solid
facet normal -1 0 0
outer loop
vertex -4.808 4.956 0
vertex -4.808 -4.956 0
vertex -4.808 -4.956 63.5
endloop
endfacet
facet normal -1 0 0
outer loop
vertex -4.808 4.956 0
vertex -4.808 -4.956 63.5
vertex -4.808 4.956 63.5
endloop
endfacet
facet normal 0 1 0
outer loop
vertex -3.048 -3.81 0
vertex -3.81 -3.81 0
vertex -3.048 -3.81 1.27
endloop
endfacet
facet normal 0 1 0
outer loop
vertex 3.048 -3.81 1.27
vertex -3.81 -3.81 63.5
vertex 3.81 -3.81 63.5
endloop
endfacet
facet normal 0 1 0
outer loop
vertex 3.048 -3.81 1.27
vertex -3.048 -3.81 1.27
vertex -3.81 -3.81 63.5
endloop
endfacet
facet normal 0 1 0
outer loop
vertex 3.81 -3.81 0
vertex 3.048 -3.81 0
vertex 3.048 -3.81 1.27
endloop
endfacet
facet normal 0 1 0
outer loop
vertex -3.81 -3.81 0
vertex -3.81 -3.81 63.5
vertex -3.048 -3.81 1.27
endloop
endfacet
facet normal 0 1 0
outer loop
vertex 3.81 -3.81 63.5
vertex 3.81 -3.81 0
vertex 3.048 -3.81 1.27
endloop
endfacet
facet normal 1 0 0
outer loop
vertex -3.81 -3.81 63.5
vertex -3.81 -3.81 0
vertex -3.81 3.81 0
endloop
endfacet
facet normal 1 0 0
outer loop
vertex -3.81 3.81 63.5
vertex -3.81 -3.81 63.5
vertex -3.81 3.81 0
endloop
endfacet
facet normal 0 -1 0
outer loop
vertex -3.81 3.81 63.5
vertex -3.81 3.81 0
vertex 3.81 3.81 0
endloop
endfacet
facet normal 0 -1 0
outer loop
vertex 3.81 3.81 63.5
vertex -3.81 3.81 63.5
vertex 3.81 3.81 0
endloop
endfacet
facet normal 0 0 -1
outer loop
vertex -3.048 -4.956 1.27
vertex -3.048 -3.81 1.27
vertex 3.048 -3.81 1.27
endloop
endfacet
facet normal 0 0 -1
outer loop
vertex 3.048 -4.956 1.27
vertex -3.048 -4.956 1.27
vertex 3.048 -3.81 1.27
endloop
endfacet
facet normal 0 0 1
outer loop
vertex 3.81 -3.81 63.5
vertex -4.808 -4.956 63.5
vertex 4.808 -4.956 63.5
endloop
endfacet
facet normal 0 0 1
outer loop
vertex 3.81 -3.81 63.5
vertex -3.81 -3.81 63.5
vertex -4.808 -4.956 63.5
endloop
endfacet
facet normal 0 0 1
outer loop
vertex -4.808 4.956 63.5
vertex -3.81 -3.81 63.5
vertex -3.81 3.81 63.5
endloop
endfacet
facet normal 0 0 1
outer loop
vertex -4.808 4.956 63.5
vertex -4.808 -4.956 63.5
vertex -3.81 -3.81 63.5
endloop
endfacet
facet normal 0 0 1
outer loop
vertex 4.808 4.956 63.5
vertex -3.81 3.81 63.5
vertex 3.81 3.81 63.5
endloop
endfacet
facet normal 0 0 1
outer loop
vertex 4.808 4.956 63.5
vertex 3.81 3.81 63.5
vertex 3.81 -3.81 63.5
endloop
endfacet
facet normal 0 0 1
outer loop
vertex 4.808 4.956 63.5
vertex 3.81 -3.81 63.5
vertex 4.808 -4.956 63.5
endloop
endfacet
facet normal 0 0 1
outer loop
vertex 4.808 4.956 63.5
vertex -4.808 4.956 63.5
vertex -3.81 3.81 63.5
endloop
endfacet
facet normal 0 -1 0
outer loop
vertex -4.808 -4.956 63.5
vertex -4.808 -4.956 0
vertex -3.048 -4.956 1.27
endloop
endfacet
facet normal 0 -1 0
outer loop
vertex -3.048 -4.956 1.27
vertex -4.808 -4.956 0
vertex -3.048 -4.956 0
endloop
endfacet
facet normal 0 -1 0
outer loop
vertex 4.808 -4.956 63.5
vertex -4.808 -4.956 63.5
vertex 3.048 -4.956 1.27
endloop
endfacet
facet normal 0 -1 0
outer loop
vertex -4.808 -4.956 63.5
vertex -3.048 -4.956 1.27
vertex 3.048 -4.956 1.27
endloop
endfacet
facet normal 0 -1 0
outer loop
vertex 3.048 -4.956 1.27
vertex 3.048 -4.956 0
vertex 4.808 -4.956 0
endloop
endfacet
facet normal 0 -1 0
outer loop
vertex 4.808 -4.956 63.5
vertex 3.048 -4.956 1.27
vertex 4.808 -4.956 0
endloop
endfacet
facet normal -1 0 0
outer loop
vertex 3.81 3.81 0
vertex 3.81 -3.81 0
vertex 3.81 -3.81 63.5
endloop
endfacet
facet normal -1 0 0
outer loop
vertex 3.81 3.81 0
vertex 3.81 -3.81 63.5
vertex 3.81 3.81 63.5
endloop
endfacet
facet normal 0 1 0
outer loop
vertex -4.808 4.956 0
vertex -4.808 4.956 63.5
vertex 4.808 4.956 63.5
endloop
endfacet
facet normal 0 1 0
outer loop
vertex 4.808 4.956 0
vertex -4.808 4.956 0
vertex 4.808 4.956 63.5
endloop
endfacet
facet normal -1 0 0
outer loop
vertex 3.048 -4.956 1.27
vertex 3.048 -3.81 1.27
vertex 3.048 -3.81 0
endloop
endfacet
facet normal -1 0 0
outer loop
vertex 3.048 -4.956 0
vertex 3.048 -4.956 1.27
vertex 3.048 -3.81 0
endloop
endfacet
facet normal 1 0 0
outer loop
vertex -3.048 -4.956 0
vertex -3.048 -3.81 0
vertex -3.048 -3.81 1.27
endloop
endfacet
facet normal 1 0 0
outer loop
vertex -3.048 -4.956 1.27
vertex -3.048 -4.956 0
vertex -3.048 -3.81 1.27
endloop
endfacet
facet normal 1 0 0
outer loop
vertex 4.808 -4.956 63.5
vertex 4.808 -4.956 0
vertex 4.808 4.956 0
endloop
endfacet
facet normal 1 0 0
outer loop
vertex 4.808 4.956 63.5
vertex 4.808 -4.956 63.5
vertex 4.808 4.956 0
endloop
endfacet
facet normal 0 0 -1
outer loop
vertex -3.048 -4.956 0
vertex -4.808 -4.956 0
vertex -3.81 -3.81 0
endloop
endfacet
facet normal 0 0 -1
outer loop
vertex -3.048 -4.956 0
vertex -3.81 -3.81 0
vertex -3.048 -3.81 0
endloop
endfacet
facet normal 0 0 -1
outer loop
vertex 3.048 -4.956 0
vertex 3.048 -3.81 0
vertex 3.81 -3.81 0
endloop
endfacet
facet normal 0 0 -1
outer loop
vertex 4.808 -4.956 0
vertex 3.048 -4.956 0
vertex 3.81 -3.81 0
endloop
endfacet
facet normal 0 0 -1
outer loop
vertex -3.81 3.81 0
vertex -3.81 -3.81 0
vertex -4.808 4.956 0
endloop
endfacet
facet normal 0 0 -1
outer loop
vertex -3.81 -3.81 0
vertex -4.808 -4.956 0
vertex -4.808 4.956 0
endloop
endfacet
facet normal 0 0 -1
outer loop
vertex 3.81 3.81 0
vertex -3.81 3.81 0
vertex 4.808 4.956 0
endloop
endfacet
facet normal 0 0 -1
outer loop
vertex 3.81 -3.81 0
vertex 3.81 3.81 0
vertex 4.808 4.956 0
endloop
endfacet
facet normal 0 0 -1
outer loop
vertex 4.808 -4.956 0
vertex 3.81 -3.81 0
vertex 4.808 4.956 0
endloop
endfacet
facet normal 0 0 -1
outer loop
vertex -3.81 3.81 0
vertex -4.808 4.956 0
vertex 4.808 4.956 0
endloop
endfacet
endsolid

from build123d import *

# Parameters (mm, degrees)
SKETCH3_W           = 9.616935552
SKETCH3_H           = 9.912195066
SKETCH3_W_2         = 7.62
SKETCH3_H_2         = 7.62
BOSS_EXTRUDE2_DEPTH = 63.5
CUT_EXTRUDE1_DEPTH  = 1.27


with BuildPart() as part:
    # Sketch3 → Boss-Extrude2 (new body)
    with BuildSketch(Plane.XY):
        Rectangle(SKETCH3_W, SKETCH3_H)
        Rectangle(SKETCH3_W_2, SKETCH3_H_2, mode=Mode.SUBTRACT)
    extrude(amount=BOSS_EXTRUDE2_DEPTH)

    # Sketch6 → Cut-Extrude1 (cut)
    with BuildSketch(Plane(origin=(0, -3.81, 0), x_dir=(1, 0, 0), z_dir=(0, 1, 0))):
        Polygon((0, 0), (-3.048, 0), (-3.048, -1.27), (3.048, -1.27), (3.048, 0), align=None)
    extrude(amount=-CUT_EXTRUDE1_DEPTH, mode=Mode.SUBTRACT)


solid = part.part
